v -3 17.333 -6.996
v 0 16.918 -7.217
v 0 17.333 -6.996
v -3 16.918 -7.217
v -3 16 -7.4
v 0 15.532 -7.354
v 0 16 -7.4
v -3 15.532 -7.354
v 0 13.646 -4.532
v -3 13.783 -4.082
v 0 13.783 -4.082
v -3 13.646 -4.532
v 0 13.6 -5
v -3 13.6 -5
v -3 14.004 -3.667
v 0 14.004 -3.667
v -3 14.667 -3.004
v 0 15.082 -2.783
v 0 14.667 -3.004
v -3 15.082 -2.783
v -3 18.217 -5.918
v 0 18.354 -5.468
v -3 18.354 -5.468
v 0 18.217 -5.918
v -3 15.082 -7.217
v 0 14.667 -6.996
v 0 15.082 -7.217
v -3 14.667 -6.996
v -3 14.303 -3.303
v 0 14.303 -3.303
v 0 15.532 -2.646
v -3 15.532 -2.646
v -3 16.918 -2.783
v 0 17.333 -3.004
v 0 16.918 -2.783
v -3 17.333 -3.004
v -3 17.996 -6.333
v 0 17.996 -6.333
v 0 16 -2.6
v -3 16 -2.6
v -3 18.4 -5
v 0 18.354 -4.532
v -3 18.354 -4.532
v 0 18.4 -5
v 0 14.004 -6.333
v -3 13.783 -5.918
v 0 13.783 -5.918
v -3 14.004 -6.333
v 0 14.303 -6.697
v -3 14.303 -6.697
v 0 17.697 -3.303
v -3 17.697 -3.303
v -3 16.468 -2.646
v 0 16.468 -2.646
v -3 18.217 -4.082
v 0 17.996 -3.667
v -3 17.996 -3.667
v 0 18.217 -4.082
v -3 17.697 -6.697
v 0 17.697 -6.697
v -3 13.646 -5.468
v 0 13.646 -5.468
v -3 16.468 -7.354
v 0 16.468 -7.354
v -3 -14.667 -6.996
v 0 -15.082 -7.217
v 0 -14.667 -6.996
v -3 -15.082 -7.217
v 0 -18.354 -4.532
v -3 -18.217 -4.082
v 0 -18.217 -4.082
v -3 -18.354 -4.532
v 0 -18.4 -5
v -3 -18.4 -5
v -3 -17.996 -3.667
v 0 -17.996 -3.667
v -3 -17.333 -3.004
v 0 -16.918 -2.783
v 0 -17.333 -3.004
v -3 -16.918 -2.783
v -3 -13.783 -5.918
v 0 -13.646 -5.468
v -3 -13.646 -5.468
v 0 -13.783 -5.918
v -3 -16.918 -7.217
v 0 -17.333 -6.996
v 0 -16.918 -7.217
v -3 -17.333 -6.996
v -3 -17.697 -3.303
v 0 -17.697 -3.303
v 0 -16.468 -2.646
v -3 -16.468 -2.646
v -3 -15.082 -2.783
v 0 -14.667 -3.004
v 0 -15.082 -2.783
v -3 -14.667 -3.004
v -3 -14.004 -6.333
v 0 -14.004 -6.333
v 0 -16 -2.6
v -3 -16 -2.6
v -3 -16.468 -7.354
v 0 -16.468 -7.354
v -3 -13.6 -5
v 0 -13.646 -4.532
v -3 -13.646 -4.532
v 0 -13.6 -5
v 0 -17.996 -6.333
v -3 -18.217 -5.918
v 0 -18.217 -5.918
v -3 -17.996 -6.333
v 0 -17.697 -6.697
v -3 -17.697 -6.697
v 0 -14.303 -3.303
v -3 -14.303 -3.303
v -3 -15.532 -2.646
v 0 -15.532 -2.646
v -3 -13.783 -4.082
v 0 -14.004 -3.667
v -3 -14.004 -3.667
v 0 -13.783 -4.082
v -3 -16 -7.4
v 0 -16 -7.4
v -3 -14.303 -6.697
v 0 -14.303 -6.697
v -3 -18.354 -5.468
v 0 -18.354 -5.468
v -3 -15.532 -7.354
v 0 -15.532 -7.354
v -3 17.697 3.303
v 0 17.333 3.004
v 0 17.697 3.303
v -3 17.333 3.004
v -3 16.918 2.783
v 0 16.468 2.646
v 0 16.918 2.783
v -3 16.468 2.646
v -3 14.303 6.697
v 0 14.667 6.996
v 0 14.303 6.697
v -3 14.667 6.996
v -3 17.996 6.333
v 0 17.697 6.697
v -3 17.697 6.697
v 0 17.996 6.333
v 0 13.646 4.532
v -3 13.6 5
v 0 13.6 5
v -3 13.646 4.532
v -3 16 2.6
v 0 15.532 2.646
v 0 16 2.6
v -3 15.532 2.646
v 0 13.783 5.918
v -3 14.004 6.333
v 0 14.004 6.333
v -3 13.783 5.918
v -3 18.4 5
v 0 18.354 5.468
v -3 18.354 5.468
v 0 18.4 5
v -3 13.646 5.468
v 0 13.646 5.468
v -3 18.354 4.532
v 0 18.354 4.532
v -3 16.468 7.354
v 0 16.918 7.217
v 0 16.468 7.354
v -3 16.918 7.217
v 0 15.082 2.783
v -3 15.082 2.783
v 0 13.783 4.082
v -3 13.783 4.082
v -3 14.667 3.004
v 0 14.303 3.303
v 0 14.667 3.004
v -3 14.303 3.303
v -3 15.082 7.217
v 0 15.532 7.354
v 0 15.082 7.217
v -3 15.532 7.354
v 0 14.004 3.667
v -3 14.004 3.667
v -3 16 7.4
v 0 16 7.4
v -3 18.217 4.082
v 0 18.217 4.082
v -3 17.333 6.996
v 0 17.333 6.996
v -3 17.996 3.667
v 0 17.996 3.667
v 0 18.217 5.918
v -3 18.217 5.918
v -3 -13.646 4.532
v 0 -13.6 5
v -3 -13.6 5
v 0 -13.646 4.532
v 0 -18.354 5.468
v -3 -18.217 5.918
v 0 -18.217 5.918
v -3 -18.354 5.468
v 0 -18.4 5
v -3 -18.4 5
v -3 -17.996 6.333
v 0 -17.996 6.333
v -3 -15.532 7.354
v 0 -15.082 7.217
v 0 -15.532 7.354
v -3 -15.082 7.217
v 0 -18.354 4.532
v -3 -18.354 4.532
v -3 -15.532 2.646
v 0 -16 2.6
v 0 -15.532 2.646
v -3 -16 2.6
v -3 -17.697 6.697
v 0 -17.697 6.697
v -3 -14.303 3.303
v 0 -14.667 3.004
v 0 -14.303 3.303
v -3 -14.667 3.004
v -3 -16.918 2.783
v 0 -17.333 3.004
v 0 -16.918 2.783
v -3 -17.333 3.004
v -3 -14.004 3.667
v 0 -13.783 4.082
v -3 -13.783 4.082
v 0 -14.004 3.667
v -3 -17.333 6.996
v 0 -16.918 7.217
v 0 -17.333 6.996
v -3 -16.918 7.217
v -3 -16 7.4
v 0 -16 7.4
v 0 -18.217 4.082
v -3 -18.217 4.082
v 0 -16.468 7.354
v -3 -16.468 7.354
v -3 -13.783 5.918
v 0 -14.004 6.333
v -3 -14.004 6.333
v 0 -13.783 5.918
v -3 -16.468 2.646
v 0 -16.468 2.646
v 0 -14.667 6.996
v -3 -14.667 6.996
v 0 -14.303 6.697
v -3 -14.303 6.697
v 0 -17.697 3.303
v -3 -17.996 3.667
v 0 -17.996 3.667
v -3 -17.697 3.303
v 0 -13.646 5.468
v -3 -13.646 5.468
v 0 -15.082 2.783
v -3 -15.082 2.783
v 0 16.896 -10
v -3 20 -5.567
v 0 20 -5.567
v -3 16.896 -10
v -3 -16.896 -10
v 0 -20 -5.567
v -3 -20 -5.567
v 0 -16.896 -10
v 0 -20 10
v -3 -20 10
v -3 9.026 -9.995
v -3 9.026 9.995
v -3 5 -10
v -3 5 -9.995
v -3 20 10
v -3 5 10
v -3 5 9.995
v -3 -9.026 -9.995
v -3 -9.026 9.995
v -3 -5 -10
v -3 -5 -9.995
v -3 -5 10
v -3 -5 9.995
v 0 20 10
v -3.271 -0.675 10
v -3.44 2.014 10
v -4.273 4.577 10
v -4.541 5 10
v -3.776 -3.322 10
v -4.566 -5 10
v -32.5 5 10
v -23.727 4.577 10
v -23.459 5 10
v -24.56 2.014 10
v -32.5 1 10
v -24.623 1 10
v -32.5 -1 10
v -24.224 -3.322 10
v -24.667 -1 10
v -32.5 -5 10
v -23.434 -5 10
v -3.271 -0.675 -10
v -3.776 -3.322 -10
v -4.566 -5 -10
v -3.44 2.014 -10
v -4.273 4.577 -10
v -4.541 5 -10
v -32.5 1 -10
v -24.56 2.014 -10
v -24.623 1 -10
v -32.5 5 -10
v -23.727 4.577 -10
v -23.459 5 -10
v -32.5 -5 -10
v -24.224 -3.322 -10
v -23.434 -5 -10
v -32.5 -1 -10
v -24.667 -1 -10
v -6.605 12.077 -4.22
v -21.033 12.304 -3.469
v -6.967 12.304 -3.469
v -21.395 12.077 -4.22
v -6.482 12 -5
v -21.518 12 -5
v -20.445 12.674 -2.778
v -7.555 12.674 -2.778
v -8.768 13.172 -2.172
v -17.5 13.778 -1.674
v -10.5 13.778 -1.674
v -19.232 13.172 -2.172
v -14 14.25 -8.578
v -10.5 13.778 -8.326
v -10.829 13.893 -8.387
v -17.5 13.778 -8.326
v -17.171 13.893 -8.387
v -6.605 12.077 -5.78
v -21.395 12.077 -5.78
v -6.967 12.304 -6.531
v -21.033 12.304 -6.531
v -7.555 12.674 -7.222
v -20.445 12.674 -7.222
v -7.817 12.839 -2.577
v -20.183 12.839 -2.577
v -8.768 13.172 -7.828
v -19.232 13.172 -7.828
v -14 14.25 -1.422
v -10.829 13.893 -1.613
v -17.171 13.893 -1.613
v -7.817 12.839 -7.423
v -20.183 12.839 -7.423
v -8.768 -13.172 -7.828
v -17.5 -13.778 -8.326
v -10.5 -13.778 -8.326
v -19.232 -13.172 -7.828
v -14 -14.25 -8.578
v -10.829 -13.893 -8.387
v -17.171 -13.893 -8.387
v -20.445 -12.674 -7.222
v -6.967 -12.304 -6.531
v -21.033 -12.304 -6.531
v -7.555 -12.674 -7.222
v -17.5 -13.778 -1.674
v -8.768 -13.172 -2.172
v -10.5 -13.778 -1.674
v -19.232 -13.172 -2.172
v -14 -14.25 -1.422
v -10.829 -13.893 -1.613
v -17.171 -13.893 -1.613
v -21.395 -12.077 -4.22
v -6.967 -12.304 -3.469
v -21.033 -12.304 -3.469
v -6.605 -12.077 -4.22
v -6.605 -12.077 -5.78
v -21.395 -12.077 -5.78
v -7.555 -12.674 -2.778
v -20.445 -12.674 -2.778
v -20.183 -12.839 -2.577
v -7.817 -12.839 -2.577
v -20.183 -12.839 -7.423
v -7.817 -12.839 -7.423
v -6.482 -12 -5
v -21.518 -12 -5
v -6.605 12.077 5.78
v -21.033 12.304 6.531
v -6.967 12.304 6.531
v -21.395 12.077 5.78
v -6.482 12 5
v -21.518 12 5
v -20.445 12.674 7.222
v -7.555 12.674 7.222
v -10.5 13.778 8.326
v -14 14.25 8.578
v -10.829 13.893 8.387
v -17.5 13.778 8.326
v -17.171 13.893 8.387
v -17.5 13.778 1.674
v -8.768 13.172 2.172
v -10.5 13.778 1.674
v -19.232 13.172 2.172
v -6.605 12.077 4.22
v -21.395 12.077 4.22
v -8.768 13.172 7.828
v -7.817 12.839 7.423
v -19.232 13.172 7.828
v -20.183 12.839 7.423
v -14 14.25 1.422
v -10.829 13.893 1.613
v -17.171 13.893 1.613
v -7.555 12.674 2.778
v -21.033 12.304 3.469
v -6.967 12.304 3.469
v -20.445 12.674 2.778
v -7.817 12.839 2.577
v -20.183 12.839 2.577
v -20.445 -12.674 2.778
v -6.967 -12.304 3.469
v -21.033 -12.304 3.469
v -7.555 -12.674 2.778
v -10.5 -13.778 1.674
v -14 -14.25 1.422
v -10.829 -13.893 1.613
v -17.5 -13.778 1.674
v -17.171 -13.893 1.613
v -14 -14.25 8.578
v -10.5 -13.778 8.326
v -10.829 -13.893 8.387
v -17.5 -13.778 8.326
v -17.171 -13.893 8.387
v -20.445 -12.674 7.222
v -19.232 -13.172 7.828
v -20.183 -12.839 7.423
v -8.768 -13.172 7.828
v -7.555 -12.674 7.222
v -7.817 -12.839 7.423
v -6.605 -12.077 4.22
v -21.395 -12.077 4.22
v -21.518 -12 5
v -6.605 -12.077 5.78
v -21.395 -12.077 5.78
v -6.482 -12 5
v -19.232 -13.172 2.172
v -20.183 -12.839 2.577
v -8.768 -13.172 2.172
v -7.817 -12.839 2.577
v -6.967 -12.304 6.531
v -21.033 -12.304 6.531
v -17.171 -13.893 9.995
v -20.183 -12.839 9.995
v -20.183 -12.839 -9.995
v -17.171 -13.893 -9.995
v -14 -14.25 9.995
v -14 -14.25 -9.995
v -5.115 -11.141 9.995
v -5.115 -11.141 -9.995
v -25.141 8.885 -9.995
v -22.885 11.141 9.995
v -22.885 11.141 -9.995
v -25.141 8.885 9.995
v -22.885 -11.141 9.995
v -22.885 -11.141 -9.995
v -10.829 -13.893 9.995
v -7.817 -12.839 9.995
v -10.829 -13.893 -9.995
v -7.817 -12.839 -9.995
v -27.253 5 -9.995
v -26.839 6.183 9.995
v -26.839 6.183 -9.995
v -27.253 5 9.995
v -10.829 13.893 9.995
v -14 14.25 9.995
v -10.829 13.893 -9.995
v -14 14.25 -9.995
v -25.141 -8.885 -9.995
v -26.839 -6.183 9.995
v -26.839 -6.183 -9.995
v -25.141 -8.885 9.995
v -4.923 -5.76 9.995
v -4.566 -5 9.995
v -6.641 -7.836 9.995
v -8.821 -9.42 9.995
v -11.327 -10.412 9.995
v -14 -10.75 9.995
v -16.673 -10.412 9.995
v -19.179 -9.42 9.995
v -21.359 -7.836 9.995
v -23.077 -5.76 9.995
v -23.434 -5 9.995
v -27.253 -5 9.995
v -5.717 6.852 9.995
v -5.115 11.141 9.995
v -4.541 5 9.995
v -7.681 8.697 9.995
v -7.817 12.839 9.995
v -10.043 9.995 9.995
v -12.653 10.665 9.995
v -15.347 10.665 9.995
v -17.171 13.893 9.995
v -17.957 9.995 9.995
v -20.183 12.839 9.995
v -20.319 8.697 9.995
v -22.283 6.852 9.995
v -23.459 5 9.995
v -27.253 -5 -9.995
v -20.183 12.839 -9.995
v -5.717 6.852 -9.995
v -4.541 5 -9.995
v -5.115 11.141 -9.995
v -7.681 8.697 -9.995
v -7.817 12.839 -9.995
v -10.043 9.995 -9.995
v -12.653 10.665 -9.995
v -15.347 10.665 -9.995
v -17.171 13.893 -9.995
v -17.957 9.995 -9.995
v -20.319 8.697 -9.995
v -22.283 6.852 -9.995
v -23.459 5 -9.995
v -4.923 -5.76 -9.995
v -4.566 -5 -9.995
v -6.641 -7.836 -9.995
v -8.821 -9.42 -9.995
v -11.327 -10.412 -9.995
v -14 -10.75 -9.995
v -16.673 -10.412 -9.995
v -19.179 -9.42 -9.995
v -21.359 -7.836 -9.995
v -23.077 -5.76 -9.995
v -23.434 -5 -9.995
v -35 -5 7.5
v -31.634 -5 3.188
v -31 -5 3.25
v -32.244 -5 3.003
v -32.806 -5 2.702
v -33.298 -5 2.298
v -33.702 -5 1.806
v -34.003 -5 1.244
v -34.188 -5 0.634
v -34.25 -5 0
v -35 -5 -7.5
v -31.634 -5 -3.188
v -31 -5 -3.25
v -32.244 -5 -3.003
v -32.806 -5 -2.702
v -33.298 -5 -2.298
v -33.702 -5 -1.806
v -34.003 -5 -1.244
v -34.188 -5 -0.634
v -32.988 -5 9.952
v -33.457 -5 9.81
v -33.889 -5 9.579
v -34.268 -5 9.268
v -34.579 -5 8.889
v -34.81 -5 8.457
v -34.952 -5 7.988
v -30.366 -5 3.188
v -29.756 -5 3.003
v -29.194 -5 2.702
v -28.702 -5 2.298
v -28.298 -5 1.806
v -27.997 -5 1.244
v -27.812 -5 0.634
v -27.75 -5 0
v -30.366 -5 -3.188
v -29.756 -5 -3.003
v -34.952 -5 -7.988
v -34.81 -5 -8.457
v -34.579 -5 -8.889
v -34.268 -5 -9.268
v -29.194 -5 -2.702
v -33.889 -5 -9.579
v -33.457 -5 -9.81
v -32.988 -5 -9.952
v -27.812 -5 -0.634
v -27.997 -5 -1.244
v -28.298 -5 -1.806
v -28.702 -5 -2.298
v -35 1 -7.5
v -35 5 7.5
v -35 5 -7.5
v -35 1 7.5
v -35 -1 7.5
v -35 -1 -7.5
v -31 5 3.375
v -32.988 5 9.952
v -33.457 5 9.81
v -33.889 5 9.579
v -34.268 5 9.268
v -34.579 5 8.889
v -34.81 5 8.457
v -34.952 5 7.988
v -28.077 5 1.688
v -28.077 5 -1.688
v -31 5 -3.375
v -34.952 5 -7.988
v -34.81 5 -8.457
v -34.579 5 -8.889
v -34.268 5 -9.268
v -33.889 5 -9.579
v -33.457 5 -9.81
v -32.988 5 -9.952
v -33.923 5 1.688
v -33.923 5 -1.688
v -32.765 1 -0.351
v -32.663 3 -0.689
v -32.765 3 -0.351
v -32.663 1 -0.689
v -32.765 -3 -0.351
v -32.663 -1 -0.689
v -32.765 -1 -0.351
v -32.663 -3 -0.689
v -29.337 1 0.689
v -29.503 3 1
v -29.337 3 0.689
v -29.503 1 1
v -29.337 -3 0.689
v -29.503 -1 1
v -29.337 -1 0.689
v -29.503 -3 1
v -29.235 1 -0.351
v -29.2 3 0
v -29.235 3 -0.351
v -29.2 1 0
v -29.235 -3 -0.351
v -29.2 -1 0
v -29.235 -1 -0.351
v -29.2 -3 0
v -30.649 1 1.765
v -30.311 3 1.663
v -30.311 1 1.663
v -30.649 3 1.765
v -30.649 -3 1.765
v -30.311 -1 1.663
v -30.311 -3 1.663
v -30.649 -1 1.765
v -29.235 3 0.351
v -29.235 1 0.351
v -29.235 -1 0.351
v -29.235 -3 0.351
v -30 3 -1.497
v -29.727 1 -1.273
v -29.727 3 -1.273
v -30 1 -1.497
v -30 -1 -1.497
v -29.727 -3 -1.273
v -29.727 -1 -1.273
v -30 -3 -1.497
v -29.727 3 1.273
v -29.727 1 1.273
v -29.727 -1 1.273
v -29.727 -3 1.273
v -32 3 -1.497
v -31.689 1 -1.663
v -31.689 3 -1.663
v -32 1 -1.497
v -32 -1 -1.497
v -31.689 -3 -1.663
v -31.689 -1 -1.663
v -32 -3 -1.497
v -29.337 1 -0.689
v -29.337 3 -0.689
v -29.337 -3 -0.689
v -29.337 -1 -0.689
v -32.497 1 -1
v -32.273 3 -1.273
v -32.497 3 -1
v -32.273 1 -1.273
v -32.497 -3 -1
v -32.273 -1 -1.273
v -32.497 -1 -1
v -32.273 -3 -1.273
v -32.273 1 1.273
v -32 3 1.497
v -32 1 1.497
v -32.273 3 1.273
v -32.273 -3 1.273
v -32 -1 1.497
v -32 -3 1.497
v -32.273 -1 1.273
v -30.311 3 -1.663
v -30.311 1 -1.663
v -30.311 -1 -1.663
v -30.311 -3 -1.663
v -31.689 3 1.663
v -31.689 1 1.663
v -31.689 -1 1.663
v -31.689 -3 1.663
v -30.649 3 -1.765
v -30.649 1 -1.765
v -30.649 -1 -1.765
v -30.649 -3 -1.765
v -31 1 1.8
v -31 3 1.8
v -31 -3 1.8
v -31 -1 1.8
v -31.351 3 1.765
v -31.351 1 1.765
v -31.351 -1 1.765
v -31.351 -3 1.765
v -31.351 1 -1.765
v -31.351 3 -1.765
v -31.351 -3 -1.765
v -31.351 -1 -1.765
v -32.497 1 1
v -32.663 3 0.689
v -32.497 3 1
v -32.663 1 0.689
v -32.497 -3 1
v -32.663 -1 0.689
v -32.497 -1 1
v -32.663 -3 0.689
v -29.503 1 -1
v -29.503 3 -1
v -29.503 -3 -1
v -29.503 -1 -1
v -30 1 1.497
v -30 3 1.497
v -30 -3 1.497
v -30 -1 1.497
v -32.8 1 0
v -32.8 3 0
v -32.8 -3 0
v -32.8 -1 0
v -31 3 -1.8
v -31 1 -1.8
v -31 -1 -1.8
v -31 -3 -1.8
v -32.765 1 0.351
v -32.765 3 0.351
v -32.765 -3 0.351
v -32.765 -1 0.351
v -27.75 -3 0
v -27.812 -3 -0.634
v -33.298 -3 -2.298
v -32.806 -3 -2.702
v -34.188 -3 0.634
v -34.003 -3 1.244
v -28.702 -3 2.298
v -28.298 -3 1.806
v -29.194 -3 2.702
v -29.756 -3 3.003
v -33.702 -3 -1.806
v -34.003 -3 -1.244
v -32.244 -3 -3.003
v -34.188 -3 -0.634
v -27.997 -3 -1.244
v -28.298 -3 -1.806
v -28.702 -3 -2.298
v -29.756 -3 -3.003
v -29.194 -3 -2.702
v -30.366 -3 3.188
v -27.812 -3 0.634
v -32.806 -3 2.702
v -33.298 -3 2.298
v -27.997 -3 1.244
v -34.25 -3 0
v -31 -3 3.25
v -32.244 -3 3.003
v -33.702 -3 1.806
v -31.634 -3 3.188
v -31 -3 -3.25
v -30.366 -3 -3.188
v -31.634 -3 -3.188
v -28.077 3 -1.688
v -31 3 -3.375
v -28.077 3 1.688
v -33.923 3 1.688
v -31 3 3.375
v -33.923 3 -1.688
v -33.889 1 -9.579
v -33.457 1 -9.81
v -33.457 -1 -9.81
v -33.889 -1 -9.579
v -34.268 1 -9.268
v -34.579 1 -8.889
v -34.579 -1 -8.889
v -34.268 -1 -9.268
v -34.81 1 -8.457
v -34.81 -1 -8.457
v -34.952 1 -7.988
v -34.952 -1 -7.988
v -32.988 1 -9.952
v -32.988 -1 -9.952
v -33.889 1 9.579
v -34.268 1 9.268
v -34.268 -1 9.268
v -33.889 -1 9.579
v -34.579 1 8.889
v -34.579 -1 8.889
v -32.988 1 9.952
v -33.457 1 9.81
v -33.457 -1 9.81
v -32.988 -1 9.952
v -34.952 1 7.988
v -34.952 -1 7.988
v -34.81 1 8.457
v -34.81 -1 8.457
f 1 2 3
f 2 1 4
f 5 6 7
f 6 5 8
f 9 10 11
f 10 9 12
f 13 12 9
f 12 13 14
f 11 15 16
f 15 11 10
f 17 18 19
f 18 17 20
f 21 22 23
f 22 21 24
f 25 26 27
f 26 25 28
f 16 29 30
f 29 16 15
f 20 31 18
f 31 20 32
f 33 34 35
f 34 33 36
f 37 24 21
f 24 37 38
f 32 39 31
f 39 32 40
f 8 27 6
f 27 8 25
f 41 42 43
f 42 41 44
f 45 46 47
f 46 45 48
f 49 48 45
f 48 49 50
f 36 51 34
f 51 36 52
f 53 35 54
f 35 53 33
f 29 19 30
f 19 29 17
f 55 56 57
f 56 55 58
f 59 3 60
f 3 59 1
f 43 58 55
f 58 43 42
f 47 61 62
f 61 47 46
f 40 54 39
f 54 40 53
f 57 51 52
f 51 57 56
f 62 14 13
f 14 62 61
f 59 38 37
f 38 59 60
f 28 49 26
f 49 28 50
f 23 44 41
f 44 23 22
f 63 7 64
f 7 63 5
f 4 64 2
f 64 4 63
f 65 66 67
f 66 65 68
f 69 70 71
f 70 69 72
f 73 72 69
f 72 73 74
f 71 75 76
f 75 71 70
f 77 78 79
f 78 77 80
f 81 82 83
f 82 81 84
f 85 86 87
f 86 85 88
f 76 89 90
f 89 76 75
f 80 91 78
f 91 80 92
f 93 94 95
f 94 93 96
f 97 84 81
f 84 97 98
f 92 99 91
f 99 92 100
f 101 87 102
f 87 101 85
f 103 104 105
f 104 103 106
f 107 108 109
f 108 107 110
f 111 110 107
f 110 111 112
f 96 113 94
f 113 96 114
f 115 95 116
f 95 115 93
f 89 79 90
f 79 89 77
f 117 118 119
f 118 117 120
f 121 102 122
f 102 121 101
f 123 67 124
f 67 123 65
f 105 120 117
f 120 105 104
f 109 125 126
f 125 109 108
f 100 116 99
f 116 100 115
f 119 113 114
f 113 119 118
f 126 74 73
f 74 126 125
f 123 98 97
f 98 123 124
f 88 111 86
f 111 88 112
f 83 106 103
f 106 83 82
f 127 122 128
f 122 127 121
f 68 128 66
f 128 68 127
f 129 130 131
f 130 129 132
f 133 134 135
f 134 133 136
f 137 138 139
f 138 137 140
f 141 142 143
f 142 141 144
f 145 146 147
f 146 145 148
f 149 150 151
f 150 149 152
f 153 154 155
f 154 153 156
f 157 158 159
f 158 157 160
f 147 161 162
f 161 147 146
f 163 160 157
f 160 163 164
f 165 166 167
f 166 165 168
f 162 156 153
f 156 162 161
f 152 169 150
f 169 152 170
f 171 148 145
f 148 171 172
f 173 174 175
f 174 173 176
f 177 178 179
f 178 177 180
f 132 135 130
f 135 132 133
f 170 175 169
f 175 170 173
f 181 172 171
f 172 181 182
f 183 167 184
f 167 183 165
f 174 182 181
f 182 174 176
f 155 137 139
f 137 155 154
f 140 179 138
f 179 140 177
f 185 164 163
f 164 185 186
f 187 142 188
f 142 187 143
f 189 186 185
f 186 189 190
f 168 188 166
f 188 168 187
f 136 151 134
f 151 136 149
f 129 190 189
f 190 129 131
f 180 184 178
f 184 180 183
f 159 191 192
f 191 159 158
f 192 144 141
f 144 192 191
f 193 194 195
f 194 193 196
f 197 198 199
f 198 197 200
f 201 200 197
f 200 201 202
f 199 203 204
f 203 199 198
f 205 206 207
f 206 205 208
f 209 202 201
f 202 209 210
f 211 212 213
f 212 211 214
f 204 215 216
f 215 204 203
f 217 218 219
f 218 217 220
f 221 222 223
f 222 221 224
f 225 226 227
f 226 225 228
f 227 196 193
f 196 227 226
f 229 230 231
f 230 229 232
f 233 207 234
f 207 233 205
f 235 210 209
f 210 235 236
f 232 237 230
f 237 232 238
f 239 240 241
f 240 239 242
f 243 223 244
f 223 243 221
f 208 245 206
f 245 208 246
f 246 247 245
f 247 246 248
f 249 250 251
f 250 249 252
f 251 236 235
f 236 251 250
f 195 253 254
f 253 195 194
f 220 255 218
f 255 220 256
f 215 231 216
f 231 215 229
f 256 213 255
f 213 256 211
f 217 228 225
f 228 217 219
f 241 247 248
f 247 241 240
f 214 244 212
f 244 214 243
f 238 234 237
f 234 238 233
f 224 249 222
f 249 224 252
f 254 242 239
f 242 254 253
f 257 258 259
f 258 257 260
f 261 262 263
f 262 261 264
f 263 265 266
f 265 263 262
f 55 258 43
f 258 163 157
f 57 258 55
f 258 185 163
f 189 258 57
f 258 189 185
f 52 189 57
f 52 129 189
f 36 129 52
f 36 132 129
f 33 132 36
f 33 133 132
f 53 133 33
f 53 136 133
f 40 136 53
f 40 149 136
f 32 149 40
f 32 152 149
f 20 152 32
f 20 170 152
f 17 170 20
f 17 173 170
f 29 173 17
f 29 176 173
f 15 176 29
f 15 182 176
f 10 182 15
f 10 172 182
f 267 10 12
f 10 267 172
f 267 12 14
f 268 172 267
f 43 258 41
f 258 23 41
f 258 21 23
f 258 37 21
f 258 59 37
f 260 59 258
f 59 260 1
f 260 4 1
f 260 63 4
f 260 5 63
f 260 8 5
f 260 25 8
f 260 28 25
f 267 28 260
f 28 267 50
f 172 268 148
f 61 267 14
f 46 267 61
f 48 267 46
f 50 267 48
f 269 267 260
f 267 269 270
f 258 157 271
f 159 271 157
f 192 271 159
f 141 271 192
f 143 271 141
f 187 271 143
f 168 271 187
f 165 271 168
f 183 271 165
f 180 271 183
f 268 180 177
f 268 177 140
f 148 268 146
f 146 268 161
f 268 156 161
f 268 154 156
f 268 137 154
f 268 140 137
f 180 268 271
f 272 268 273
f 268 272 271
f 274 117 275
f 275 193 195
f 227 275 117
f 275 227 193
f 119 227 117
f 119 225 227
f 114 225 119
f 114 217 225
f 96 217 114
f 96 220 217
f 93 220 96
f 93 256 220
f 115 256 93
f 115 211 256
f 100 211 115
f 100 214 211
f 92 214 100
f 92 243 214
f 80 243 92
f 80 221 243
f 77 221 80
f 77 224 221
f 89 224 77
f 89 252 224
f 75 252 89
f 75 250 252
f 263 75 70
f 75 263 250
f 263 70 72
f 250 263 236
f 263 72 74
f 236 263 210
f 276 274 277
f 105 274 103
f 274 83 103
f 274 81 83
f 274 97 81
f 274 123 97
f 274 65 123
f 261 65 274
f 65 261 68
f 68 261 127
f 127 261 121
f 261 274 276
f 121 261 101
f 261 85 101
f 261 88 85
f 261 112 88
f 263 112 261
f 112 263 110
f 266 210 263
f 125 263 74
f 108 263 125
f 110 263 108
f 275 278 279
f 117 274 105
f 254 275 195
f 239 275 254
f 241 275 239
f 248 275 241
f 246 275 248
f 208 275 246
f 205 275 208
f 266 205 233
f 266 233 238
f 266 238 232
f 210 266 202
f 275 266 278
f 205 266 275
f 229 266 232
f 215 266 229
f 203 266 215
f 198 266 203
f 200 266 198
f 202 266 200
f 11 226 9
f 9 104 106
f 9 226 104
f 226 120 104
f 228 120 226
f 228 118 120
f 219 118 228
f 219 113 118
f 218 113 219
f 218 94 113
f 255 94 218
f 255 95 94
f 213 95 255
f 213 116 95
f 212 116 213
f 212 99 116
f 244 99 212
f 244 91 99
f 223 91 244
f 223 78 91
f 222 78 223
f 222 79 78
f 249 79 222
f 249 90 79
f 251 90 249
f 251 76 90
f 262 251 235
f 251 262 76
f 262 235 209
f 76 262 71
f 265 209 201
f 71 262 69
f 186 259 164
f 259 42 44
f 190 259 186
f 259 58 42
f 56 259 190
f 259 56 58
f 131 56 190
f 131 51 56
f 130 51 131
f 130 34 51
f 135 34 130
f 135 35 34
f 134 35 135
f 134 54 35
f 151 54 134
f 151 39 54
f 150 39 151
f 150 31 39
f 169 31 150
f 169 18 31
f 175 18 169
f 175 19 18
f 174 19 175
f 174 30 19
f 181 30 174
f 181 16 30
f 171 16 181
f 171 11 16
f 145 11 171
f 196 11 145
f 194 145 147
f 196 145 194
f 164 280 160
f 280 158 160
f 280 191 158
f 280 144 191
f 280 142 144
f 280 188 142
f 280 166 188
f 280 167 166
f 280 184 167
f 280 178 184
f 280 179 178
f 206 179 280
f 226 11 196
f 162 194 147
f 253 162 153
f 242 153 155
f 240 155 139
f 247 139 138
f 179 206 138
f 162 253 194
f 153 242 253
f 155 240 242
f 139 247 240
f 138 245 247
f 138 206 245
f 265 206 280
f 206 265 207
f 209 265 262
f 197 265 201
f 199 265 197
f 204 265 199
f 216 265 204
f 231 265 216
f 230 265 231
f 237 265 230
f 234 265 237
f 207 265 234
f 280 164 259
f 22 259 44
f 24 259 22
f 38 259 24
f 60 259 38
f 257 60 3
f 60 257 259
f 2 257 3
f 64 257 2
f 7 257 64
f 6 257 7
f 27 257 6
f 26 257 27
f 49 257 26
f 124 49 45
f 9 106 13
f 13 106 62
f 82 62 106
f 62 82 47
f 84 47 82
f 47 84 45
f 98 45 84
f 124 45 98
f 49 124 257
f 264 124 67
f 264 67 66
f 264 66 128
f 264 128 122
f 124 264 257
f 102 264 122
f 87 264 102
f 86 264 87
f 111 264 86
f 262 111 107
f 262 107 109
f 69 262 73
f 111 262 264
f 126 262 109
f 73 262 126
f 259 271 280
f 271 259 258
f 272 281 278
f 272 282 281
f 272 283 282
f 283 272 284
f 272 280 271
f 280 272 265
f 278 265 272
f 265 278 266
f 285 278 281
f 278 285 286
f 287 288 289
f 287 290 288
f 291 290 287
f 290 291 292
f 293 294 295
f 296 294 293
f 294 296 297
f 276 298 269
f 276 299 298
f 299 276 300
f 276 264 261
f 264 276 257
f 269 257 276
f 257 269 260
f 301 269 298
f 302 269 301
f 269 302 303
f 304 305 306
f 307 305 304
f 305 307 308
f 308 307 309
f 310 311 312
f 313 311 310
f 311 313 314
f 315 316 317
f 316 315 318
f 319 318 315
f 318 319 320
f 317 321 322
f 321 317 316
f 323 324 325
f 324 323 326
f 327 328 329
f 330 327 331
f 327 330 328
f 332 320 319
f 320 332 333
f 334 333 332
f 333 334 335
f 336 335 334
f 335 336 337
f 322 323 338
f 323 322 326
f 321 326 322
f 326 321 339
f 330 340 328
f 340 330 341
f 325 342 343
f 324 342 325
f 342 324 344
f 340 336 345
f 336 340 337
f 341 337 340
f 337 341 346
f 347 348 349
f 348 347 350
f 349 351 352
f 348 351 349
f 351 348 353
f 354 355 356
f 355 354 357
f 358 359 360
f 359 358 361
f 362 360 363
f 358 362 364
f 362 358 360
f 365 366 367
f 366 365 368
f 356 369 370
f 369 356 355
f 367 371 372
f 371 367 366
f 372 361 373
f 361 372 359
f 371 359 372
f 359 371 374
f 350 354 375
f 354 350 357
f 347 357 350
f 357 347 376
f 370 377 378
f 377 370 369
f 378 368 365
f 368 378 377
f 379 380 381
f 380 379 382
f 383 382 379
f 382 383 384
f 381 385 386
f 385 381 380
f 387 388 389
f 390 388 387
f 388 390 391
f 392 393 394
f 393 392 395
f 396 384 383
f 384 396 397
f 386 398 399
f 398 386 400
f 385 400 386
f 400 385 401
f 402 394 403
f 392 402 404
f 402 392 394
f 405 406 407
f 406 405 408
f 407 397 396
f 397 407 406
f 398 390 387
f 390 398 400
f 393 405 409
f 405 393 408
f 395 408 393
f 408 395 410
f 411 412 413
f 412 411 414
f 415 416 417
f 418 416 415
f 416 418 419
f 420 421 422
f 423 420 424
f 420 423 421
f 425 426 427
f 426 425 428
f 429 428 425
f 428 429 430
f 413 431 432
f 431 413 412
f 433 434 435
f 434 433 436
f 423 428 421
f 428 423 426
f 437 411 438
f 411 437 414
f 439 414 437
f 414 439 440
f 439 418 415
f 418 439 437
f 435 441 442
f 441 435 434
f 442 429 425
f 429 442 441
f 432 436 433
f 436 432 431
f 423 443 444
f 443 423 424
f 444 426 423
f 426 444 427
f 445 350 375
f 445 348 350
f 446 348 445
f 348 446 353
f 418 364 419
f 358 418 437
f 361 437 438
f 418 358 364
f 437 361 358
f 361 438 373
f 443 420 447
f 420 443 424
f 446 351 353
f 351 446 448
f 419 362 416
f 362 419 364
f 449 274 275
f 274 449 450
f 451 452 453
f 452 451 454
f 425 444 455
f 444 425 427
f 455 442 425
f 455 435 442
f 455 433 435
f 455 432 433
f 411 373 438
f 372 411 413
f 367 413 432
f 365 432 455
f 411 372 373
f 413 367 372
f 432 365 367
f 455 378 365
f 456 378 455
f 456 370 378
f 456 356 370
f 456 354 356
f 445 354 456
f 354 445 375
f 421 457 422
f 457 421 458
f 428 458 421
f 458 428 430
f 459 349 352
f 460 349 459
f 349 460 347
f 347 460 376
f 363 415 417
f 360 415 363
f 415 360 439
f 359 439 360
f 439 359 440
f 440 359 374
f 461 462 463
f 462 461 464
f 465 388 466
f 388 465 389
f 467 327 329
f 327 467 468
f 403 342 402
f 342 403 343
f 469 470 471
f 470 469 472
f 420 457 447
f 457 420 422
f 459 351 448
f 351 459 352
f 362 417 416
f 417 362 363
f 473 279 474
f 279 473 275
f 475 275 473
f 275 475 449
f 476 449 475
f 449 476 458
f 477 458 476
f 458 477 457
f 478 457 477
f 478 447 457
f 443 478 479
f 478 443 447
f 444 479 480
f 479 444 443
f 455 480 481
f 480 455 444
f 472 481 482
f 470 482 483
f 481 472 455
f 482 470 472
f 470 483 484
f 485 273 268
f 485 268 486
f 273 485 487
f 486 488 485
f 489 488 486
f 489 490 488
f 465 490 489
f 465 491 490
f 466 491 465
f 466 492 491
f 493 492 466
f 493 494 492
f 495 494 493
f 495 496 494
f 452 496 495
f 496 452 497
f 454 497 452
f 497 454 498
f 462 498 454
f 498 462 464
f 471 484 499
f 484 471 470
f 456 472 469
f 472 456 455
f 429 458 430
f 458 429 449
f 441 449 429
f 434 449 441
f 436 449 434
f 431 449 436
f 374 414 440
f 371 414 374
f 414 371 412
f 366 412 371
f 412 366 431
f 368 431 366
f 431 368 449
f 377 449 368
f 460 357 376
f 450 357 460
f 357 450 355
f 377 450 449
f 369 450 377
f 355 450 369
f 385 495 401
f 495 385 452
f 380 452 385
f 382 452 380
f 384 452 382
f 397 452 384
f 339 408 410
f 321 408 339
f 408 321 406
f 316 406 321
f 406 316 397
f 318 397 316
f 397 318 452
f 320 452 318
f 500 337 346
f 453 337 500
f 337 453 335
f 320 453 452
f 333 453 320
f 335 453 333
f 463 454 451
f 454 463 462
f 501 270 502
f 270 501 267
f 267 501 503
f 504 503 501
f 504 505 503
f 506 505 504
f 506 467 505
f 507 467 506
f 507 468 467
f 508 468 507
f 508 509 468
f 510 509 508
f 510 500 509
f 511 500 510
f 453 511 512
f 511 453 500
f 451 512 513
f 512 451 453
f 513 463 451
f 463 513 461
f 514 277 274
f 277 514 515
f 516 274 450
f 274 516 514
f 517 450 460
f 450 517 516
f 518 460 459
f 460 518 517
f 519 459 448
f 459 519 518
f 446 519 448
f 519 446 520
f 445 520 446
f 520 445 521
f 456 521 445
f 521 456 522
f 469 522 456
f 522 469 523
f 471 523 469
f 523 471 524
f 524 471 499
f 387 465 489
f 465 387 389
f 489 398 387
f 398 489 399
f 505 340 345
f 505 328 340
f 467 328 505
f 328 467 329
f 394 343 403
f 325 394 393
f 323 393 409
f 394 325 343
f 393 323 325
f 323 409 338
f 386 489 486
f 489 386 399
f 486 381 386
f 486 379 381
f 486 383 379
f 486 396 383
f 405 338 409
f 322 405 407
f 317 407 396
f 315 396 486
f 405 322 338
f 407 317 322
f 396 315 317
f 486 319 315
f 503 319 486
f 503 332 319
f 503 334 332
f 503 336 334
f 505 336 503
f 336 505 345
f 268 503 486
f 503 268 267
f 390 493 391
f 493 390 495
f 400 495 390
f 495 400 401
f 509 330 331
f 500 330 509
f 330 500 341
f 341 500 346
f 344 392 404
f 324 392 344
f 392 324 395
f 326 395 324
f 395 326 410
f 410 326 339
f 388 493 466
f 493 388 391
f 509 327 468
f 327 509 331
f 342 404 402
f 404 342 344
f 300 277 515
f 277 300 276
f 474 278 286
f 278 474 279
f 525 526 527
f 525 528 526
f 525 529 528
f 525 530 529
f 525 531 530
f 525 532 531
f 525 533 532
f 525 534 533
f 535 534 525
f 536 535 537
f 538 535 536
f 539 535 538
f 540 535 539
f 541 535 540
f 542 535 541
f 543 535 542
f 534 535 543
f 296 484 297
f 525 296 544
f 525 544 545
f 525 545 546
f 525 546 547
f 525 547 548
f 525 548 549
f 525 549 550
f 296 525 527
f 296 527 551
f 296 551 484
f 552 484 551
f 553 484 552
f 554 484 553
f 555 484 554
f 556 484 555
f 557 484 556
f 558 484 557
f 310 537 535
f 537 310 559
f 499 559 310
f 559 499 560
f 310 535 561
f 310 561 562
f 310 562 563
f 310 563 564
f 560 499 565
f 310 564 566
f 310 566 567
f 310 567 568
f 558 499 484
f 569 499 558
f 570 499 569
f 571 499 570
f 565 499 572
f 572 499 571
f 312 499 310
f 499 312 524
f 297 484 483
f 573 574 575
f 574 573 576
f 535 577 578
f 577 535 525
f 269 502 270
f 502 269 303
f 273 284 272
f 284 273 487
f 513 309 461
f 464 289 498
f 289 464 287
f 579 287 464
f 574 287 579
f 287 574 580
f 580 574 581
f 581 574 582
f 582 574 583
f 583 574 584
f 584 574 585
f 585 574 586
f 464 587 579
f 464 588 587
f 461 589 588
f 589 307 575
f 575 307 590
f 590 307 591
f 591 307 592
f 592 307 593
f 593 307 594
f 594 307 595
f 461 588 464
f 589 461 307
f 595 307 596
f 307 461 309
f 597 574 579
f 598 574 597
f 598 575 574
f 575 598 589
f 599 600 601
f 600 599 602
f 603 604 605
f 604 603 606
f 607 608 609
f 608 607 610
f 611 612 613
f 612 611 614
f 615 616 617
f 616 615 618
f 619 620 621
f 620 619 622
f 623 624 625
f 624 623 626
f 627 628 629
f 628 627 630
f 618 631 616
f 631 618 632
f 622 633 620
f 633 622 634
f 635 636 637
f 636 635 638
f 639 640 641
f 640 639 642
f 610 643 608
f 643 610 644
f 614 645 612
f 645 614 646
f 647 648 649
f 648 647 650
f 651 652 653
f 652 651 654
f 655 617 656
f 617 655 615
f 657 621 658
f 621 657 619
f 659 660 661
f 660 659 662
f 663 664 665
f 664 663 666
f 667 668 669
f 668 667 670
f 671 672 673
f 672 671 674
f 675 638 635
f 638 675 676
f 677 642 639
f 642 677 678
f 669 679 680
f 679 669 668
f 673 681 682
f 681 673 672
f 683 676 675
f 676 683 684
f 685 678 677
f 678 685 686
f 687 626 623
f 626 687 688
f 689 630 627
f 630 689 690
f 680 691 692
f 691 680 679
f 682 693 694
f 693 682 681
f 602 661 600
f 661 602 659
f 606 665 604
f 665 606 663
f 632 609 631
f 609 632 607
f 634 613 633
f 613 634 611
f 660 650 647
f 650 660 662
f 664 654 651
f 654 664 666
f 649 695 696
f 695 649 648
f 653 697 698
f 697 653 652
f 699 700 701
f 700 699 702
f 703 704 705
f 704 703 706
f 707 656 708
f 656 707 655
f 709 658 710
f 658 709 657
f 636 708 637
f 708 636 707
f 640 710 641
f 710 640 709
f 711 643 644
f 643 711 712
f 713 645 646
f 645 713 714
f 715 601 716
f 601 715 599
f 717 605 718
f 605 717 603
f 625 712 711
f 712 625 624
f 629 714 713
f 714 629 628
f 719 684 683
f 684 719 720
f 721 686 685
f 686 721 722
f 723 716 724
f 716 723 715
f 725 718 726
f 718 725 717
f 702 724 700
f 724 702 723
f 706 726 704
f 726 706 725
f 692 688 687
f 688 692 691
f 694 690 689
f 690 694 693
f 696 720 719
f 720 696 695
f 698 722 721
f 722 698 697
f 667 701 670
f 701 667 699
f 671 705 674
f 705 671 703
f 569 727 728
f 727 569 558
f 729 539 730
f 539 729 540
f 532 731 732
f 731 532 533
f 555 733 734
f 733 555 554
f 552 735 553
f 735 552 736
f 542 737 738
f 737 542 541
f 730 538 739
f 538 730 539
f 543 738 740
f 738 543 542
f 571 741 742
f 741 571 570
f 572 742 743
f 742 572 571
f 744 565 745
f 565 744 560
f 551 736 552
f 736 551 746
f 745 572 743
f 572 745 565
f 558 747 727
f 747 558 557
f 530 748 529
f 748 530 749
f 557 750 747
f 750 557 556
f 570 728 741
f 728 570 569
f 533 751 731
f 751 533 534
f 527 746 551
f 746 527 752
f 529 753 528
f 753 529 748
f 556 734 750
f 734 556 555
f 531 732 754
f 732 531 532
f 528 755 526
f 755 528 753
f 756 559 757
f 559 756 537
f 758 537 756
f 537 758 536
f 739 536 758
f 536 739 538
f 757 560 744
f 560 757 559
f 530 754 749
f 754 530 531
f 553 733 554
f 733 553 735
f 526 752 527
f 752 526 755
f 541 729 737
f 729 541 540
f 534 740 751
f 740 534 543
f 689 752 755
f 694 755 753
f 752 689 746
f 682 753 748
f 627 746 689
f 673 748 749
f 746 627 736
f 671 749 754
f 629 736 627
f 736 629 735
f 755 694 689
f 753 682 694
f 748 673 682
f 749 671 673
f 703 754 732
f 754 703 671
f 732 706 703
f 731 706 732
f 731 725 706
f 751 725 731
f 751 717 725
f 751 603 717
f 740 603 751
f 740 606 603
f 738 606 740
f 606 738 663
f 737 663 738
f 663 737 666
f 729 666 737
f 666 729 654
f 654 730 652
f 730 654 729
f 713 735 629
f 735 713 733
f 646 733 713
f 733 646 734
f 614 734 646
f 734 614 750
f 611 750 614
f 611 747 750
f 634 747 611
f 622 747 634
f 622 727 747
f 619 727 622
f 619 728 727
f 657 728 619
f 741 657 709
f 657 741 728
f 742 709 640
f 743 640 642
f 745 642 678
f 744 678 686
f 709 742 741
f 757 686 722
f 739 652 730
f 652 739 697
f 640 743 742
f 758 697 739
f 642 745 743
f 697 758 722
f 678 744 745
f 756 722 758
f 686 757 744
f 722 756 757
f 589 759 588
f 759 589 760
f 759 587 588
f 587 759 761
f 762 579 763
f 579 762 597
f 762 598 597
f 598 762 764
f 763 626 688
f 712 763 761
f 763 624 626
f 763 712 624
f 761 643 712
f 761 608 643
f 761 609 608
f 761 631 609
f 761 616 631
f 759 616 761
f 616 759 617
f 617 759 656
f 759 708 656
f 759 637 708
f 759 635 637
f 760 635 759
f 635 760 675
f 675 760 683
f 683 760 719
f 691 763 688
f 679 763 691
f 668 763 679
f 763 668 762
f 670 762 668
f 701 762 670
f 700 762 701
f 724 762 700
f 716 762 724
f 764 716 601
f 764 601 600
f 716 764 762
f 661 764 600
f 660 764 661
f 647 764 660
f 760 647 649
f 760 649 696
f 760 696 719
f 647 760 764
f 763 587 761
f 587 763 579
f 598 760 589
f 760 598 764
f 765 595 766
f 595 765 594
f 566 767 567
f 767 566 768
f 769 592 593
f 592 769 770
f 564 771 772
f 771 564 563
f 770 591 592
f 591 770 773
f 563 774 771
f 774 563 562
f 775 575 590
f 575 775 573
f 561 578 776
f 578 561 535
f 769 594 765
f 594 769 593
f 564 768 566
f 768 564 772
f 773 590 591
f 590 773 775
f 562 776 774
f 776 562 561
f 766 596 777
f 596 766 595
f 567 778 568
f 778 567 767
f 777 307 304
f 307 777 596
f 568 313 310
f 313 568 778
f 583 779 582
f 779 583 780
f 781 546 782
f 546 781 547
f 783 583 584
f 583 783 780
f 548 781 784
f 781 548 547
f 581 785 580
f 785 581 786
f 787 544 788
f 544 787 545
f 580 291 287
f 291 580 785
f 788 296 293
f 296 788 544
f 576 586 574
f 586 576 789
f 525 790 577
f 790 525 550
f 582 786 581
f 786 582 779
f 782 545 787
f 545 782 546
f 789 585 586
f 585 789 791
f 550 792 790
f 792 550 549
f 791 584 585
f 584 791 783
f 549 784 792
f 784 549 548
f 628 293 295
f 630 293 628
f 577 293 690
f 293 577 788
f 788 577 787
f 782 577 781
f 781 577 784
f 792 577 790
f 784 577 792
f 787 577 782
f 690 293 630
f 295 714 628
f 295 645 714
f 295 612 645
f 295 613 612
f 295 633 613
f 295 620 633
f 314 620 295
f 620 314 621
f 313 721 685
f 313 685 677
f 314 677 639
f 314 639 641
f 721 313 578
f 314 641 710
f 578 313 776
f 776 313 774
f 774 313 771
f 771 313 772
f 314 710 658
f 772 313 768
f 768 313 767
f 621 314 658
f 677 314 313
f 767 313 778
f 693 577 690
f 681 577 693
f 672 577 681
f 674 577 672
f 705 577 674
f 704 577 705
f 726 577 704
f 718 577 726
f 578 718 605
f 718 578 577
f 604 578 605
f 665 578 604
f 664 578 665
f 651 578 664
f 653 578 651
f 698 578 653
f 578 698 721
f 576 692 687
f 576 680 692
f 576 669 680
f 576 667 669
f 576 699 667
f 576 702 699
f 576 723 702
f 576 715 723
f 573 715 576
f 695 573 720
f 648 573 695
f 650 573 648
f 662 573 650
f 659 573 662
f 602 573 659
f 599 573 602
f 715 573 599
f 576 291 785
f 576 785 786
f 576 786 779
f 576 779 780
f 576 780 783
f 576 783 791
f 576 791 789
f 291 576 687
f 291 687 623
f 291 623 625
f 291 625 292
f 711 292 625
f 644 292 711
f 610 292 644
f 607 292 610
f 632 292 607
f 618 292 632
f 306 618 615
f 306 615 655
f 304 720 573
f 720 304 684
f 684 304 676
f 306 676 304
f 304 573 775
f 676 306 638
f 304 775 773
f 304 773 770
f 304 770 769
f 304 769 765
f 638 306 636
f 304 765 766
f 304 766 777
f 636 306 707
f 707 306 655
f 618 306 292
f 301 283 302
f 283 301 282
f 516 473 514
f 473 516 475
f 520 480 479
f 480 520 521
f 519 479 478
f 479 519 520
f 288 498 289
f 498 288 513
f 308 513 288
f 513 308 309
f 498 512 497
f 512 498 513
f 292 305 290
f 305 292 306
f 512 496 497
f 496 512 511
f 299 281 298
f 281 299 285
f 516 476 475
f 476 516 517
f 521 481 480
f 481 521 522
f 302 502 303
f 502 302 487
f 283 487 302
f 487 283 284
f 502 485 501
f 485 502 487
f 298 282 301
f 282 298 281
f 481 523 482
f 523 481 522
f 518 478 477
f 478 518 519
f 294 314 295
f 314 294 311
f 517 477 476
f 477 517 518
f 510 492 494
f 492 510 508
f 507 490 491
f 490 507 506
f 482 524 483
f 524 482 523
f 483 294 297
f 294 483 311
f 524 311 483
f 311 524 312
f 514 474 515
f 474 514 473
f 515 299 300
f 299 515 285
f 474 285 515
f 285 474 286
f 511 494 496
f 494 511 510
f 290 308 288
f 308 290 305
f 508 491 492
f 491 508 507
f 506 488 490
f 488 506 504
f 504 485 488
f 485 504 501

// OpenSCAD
lm8uu_length = 15;
lm8luu_length = 45;
lm12uu_length = 20;
height = 35;
lm8uu_diam = 15.5;
lm12uu_diam = 21.5;
extrusion_width = 20;

retaining_hole_offset = 4;
retaining_hole_diam = 3.6;
retaining_hole_countersink_diam = 6.5;
retaining_hole_countersink_depth = 2;
retaining_hole_nuttrap_depth = 4.1;

block_width = 10;
barrel_thickness = 7;
barrel_offset = 14;
gap_width = 2;

mount_width = extrusion_width * 2;
mount_height = 3;
mount_length = 5; // len/2 = center
mount_hole_spacing = extrusion_width * 2 - 8;
mount_hole_2_distance = 10;
mount_hole_diam = 4.8;
mount_screwhead_clearance_diam = 8;

corner_round_diam = 5;
emboss_heart_height = 0.0;
DEBUG = 0;

if (true)
{   
    rotate([90 * (1-DEBUG), 0, -90 * (1-DEBUG)])
    lm12uu_holder();
}

module lm8uu_holder()
{
    bearing_holder(length = lm8uu_length);
}

module lm8luu_holder()
{
    bearing_holder(length = lm8luu_length);
}

module lm12uu_holder()
{
    bearing_holder(length = lm12uu_length, diameter = lm12uu_diam);
}

module bearing_holder2(length = lm8uu_length, diameter = lm8uu_diam)
{
        union()
        {
            // main block
            translate([0, 0, height/2])
            cube([block_width, length, height], center=true);

            translate([0, 0, barrel_offset])
            translate([0, -0.05/2, 0])
            rotate([90, 0, 0])
            cylinder(d=diameter + barrel_thickness, h=length-0.05, center=true, $fn=28);
        }
}

module bearing_holder(length = lm8uu_length, diameter = lm8uu_diam)
{
    // mount plate
    color("greenyellow") difference()
    {
        translate([0, 0, mount_height/2])
        cube([mount_width, length, mount_height], center=true);
        
        // mount holes
        for(i=[-1, 1])
            translate([mount_hole_spacing/2*i, -length/2+mount_length, 0])
            cylinder(d=mount_hole_diam, h=50, $fn=32, center=true);
        
        // mount holes 2
        for(i=[-1, 1])
            translate([mount_hole_spacing/2*i, -length/2+mount_length + mount_hole_2_distance, 0])
            cylinder(d=mount_hole_diam, h=50, $fn=32, center=true);
        
        // remove the mount plate above the hole, we don't need it
        translate([0, 50, 0])
        translate([0, mount_hole_diam/2+9.5, 0])
        cube([100, 100, 100], center=true);
        
        // cut the corner at the bottom
        for(i=[-1, 1])
            translate([mount_hole_spacing/2*i, 0, mount_height/2])
            translate([7*i, -length/2, 0])
            rotate([0, 0, -35*i])
            cube([10, 10, mount_height+2], center=true);
    }
    
    color("greenyellow") difference()
    {
        union()
        {
            // main block
            translate([0, 0, height/2])
            cube([block_width, length, height], center=true);

            // barrel
            difference()
            {
                translate([0, 0, barrel_offset])
                rotate([90, 0, 0])
                // need the tiny epsilon to avoid manifold errors in stl
                cylinder(d=diameter+barrel_thickness, h=length-0.01, center=true, $fn=28);
                
                // cut everything lower than the mountplate
                translate([0, 0, -50])
                translate([0, 0, mount_height])
                cube([100, 100, 100], center=true);
                
                // make clearance for the heads of the mounting screws to be inserted
                for(i=[-1, 1])
                    translate([mount_hole_spacing/2*i, -length/2+mount_length, 0])
                    cylinder(d=mount_screwhead_clearance_diam, h=height*2+1, $fn=32, center=true);
                
                // make clearance for the second set of heads of the mounting screws to be inserted
                for(i=[-1, 1])
                    translate([mount_hole_spacing/2*i, -length/2+mount_length + mount_hole_2_distance, 0])
                    cylinder(d=mount_screwhead_clearance_diam, h=height*2+1, $fn=32, center=true);
            }
        }
        
        // square cutout at top
        translate([0, 0, height/2+height/4])
        cube([gap_width, length+1, height/2+0.1], center=true);
        
        // hollow out barrel
        translate([0, 0, barrel_offset])
        rotate([90, 0, 0])
        cylinder(d=diameter, h=length+0.1, center=true, $fn=25);
        
        // retaining hole for squeezing lm8uu
        translate([0, 0, height])
        translate([0, 0, -retaining_hole_offset])
        {
            rotate([0, 90, 0])
            cylinder(d=retaining_hole_diam, h=block_width+1, $fn=32, center=true);
            
            // countersinking for retaining hole screwhead on one side
            translate([block_width/2, 0, 0])
            translate([0.1, 0, 0])     // epsilon
            rotate([0, 0, 180])
            rotate([0, 90, 0])
            cylinder(d=retaining_hole_countersink_diam, h=retaining_hole_countersink_depth+0.1, $fn=32);
            
            // nut trap on the other side
            translate([-block_width/2, 0, 0])
            translate([-0.1, 0, 0])     // epsilon
            rotate([0, 90, 0])
            rotate([0, 0, 360/6/2])
            cylinder(r=5.5 / cos(180 / 6) / 2 + 0.2, h=retaining_hole_nuttrap_depth+0.1, $fn=6, center=true);
        }
        
        // rounded corners
        for(i=[-1,1])
        {
            translate([0, 0, height])
            translate([0, 0, -corner_round_diam/2])
            translate([0, length/2 * i, 0])
            translate([0, -corner_round_diam/2 * i, 0])
            rounded_corner(diam = corner_round_diam, side = i);
        }
    }
    
    // hearts on top of bearing
    for(i=[-1,1])
    {
        translate([0, length/2, 0])
        translate([0, emboss_heart_height/2, 0])
        translate([0, 0, height])
        translate([block_width/2*i, 0, 0])
        translate([-(block_width-gap_width)/4*i, 0, 0])
        translate([0, 0, -6])
        {
            //%cube([3, 3, 3], center=true);
            
            translate([-2.1, 0, -2.5])
            rotate([90, 0, 0])
            color(DEBUG ? "blueviolet" : "greenyellow")
            linear_extrude(height=emboss_heart_height, center=true)
            scale([0.075, 0.075, 1])
            import("heart.dxf", center=true);
        }
    }
}

module rounded_corner(diam, side)
{
    difference()
    {
        cube([500, diam+0.1, diam+0.1], center=true);
        
        rotate([0, 90, 0])
        cylinder(d=diam, h=501, $fn=32, center=true);
        
        // cut off the bottom half
        translate([0, 0, -diam/2])
        cube([502, diam+1, diam], center=true);
        
        // cut off either the left or right side depending on side variable
        translate([0, diam/2 * -side, 0])
        cube([502, diam, diam+1], center=true);
    }
}
